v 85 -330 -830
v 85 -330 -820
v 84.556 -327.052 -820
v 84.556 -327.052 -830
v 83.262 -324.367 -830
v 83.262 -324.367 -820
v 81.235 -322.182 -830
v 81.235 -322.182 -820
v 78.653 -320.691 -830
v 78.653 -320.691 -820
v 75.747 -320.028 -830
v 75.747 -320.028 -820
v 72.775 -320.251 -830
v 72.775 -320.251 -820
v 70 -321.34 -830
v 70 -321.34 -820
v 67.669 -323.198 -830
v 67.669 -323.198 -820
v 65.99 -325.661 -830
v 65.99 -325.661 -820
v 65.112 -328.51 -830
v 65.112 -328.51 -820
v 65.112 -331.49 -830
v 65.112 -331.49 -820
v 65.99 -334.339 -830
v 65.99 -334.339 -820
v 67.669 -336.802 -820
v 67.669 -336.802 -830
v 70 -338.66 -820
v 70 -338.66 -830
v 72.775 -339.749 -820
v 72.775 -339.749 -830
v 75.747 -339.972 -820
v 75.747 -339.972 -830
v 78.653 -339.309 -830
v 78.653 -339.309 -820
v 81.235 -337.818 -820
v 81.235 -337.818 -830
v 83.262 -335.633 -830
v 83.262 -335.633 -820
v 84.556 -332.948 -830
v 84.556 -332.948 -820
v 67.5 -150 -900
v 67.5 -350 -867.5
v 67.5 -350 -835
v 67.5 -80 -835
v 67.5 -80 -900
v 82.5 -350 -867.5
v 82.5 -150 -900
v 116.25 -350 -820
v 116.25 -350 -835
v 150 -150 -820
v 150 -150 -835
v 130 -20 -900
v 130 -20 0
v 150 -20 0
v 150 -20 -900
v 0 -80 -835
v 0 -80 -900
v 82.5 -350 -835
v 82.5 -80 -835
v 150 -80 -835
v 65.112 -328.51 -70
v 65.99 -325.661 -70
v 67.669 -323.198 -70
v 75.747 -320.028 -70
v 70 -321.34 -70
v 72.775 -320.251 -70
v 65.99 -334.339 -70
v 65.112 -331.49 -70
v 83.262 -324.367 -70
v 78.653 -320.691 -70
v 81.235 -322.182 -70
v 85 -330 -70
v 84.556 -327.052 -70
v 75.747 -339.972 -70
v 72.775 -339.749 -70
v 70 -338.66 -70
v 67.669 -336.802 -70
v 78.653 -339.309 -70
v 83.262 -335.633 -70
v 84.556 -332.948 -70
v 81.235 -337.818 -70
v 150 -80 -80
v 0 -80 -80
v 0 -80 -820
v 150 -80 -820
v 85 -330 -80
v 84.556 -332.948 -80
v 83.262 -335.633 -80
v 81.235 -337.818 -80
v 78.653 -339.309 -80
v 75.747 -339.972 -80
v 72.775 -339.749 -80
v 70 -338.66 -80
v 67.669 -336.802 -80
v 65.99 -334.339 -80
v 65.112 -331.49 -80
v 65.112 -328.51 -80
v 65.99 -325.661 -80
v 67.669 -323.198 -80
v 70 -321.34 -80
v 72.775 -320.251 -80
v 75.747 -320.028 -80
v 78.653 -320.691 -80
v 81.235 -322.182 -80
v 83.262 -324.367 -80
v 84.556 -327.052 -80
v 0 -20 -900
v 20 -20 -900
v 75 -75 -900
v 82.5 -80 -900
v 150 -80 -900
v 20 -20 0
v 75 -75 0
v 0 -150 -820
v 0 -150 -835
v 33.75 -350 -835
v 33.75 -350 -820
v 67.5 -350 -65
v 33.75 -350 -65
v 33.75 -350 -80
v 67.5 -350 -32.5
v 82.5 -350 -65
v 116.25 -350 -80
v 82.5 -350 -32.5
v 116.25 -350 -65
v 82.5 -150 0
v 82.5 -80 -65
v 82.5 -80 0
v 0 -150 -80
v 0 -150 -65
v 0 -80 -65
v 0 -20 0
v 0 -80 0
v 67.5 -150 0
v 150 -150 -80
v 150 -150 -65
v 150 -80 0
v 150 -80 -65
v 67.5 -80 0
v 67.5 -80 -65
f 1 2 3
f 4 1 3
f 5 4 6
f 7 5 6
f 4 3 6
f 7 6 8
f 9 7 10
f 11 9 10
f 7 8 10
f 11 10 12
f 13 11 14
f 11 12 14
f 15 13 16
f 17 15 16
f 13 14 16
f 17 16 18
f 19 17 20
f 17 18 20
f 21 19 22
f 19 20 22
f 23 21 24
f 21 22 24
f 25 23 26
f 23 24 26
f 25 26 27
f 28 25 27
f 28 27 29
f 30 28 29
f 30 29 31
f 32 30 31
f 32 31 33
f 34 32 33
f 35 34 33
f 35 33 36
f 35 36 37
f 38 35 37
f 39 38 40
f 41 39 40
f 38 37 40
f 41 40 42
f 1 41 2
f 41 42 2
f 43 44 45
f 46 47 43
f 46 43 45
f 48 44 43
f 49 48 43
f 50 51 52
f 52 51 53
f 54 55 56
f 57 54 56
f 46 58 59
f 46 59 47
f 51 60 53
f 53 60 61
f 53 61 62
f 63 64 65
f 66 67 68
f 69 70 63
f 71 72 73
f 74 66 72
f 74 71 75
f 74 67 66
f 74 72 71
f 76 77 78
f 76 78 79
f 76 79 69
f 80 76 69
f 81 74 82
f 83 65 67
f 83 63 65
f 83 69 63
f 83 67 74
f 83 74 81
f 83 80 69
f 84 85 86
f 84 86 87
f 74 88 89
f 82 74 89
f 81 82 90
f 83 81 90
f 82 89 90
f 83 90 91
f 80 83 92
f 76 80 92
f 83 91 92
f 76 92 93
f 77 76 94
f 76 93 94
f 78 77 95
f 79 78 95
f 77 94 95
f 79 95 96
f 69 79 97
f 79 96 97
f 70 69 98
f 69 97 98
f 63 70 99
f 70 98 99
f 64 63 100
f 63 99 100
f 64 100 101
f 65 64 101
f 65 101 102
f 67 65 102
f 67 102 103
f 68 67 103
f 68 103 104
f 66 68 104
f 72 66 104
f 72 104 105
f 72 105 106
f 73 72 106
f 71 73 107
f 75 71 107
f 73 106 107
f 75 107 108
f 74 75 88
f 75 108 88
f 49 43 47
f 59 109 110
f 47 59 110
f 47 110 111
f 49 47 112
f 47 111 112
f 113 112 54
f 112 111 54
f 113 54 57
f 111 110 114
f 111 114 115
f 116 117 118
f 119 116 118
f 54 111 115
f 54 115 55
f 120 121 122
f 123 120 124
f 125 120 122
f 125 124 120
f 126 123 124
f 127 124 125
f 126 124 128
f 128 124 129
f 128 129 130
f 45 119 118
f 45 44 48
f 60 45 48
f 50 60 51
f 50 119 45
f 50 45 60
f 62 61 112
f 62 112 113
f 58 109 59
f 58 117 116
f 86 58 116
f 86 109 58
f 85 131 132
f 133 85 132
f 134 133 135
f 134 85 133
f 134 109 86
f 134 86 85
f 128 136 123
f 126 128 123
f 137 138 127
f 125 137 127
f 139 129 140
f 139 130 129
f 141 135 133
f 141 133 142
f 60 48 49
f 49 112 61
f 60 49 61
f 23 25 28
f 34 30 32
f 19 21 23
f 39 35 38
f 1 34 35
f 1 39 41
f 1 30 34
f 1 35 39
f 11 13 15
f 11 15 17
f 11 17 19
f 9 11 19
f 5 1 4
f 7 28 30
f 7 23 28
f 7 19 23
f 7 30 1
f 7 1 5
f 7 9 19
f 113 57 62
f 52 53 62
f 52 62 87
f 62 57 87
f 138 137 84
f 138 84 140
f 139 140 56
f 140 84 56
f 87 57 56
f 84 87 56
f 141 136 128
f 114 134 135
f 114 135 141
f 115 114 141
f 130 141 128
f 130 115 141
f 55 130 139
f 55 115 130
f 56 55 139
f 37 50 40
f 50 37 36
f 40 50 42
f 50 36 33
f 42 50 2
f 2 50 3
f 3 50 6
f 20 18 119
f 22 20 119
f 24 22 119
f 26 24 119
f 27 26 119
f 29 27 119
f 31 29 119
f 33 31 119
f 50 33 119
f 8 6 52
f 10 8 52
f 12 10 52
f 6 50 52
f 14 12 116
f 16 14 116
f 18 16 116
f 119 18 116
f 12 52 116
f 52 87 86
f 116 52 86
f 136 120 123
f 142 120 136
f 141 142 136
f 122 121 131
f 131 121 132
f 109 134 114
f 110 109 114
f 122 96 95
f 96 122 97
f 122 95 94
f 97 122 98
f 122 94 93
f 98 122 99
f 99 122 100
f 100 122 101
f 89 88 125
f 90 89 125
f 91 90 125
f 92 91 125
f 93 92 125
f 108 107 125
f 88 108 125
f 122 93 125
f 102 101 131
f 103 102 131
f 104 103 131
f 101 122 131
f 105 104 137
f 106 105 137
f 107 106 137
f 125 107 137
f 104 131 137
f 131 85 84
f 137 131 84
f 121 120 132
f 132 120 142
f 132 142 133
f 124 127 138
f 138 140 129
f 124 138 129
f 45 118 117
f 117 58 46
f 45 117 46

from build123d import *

# Parameters (mm, degrees)
F0_W      = 150
F0_H      = 900
F1_DEPTH  = 80
F2_W      = 15
F2_H      = 65
F3_DEPTH  = 270
F5_DEPTH  = 25
F7_DEPTH  = 25
F9_DEPTH  = 25
F11_DEPTH = 25
F13_DEPTH = 25
F15_DEPTH = 25
F16_R     = 10
F17_DEPTH = 10
F18_R     = 10
F19_DEPTH = 10
F21_DEPTH = 900.001


with BuildPart() as f1:
    # F0 (on Front) → F1 (new body)
    with BuildSketch(Plane.XZ):
        with Locations((75, -450)):
            Rectangle(F0_W, F0_H)
    extrude(amount=F1_DEPTH)

    # F2 (on face) → F3 (join)
    with BuildSketch(Plane.XZ.offset(80)):
        Polygon((67.5, -65), (0, -65), (0, -80), (150, -80), (150, -65), (82.5, -65), align=None)
        with Locations((75, -32.5)):
            Rectangle(F2_W, F2_H)
        Polygon((150, -820), (0, -820), (0, -835), (67.5, -835), (82.5, -835), (150, -835), align=None)
        with Locations((75, -867.5)):
            Rectangle(F2_W, F2_H)
    extrude(amount=F3_DEPTH)

    # F4 (on face) → F5 (cut)
    with BuildSketch(Plane(origin=(67.5, 0, 0), x_dir=(0, -1, 0), z_dir=(-1, 0, 0))):
        Polygon((350, 0), (150, 0), (350, -32.5), align=None)
    extrude(amount=-F5_DEPTH, mode=Mode.SUBTRACT)

    # F6 (on face) → F7 (cut)
    with BuildSketch(Plane.XY.offset(-65)):
        Polygon((150, -150), (116.25, -350), (150, -350), align=None)
    extrude(amount=-F7_DEPTH, mode=Mode.SUBTRACT)

    # F8 (on face) → F9 (cut)
    with BuildSketch(Plane.XY.offset(-65)):
        Polygon((0, -350), (33.75, -350), (0, -150), align=None)
    extrude(amount=-F9_DEPTH, mode=Mode.SUBTRACT)

    # F10 (on face) → F11 (cut)
    with BuildSketch(Plane(origin=(0, 0, -835), x_dir=(1, 0, 0), z_dir=(0, 0, -1))):
        Polygon((150, 350), (116.25, 350), (150, 150), align=None)
    extrude(amount=-F11_DEPTH, mode=Mode.SUBTRACT)

    # F12 (on face) → F13 (cut)
    with BuildSketch(Plane(origin=(0, 0, -835), x_dir=(1, 0, 0), z_dir=(0, 0, -1))):
        Polygon((0, 150), (33.75, 350), (0, 350), align=None)
    extrude(amount=-F13_DEPTH, mode=Mode.SUBTRACT)

    # F14 (on face) → F15 (cut)
    with BuildSketch(Plane(origin=(67.5, 0, 0), x_dir=(0, -1, 0), z_dir=(-1, 0, 0))):
        Polygon((350, -900), (350, -867.5), (150, -900), align=None)
    extrude(amount=-F15_DEPTH, mode=Mode.SUBTRACT)

    # F16 (on face) → F17 (cut)
    with BuildSketch(Plane(origin=(0, 0, -80), x_dir=(1, 0, 0), z_dir=(0, 0, -1))):
        with Locations((75, 330)):
            Circle(F16_R)
    extrude(amount=-F17_DEPTH, mode=Mode.SUBTRACT)

    # F18 (on face) → F19 (cut)
    with BuildSketch(Plane.XY.offset(-820)):
        with Locations((75, -330)):
            Circle(F18_R)
    extrude(amount=-F19_DEPTH, mode=Mode.SUBTRACT)

    # F20 (on face) → F21 (cut, through all)
    with BuildSketch(Plane.XY):
        Polygon((130, -20), (20, -20), (75, -75), align=None)
        Polygon((150, 0), (0, 0), (20, -20), (130, -20), align=None)
        Polygon((20, -20), (0, 0), (0, -20), align=None)
        Polygon((150, -20), (150, 0), (130, -20), align=None)
    extrude(amount=-F21_DEPTH, mode=Mode.SUBTRACT)


solid = f1.part
